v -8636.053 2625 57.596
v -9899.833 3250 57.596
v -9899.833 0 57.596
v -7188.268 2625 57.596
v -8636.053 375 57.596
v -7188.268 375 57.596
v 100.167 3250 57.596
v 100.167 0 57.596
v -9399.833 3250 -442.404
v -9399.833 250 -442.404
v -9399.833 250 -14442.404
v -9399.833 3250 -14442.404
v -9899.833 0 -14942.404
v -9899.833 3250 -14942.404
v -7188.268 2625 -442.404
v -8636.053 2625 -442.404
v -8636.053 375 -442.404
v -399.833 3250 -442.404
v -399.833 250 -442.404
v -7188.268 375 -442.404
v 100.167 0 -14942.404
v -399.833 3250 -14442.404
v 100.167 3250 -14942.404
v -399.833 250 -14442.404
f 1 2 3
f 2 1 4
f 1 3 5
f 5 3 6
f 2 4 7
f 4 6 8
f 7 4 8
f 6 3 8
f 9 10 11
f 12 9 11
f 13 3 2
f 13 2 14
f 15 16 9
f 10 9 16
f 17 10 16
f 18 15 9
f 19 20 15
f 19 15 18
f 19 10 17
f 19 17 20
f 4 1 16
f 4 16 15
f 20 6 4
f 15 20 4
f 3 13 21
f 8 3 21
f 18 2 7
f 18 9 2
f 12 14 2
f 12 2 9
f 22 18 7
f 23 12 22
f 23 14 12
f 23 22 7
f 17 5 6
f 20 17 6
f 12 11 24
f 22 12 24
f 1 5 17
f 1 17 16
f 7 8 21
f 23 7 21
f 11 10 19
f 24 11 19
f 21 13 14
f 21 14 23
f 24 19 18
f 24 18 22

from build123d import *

# Parameters (mm, degrees)
SKETCH1_W          = 10000
SKETCH1_H          = 15000
BASE_DEPTH         = 250
SKETCH3_W          = 10000
SKETCH3_H          = 500
WALL_1_DEPTH       = 3000
SKETCH4_W          = 500
SKETCH4_H          = 14000
WALL_2_DEPTH       = 3000
SKETCH5_W          = 500
SKETCH5_H          = 14000
WALL_3_DEPTH       = 3000
SKETCH6_W          = 10000
SKETCH6_H          = 500
WALL_4_DEPTH       = 3000
SKETCH8_W          = 1447.785248023
SKETCH8_H          = 2250
CUT_EXTRUDE1_DEPTH = 2000


with BuildPart() as part:
    # Sketch1 → Base (new body)
    with BuildSketch(Plane(origin=(0, 0, 0), x_dir=(1, 0, 0), z_dir=(0, 1, 0))):
        with Locations((-4899.833055092, 7442.404006678)):
            Rectangle(SKETCH1_W, SKETCH1_H)
    extrude(amount=BASE_DEPTH)

    # Sketch3 → Wall_1 (add)
    with BuildSketch(Plane(origin=(0, 250, 0), x_dir=(1, 0, 0), z_dir=(0, 1, 0))):
        with Locations((-4899.833055092, 192.404006678)):
            Rectangle(SKETCH3_W, SKETCH3_H)
    extrude(amount=WALL_1_DEPTH)

    # Sketch4 → Wall_2 (add)
    with BuildSketch(Plane(origin=(0, 250, 0), x_dir=(1, 0, 0), z_dir=(0, 1, 0))):
        with Locations((-9649.833055092, 7442.404006678)):
            Rectangle(SKETCH4_W, SKETCH4_H)
    extrude(amount=WALL_2_DEPTH)

    # Sketch5 → Wall_3 (add)
    with BuildSketch(Plane(origin=(0, 250, 0), x_dir=(1, 0, 0), z_dir=(0, 1, 0))):
        with Locations((-149.833055092, 7442.404006678)):
            Rectangle(SKETCH5_W, SKETCH5_H)
    extrude(amount=WALL_3_DEPTH)

    # Sketch6 → Wall_4 (add)
    with BuildSketch(Plane(origin=(0, 250, 0), x_dir=(1, 0, 0), z_dir=(0, 1, 0))):
        with Locations((-4899.833055092, 14692.404006678)):
            Rectangle(SKETCH6_W, SKETCH6_H)
    extrude(amount=WALL_4_DEPTH)

    # Sketch8 → Cut-Extrude1 (cut)
    with BuildSketch(Plane.XY.offset(57.595993322)):
        with Locations((-7912.16042598, 1500)):
            Rectangle(SKETCH8_W, SKETCH8_H)
    extrude(amount=-CUT_EXTRUDE1_DEPTH, mode=Mode.SUBTRACT)


solid = part.part
